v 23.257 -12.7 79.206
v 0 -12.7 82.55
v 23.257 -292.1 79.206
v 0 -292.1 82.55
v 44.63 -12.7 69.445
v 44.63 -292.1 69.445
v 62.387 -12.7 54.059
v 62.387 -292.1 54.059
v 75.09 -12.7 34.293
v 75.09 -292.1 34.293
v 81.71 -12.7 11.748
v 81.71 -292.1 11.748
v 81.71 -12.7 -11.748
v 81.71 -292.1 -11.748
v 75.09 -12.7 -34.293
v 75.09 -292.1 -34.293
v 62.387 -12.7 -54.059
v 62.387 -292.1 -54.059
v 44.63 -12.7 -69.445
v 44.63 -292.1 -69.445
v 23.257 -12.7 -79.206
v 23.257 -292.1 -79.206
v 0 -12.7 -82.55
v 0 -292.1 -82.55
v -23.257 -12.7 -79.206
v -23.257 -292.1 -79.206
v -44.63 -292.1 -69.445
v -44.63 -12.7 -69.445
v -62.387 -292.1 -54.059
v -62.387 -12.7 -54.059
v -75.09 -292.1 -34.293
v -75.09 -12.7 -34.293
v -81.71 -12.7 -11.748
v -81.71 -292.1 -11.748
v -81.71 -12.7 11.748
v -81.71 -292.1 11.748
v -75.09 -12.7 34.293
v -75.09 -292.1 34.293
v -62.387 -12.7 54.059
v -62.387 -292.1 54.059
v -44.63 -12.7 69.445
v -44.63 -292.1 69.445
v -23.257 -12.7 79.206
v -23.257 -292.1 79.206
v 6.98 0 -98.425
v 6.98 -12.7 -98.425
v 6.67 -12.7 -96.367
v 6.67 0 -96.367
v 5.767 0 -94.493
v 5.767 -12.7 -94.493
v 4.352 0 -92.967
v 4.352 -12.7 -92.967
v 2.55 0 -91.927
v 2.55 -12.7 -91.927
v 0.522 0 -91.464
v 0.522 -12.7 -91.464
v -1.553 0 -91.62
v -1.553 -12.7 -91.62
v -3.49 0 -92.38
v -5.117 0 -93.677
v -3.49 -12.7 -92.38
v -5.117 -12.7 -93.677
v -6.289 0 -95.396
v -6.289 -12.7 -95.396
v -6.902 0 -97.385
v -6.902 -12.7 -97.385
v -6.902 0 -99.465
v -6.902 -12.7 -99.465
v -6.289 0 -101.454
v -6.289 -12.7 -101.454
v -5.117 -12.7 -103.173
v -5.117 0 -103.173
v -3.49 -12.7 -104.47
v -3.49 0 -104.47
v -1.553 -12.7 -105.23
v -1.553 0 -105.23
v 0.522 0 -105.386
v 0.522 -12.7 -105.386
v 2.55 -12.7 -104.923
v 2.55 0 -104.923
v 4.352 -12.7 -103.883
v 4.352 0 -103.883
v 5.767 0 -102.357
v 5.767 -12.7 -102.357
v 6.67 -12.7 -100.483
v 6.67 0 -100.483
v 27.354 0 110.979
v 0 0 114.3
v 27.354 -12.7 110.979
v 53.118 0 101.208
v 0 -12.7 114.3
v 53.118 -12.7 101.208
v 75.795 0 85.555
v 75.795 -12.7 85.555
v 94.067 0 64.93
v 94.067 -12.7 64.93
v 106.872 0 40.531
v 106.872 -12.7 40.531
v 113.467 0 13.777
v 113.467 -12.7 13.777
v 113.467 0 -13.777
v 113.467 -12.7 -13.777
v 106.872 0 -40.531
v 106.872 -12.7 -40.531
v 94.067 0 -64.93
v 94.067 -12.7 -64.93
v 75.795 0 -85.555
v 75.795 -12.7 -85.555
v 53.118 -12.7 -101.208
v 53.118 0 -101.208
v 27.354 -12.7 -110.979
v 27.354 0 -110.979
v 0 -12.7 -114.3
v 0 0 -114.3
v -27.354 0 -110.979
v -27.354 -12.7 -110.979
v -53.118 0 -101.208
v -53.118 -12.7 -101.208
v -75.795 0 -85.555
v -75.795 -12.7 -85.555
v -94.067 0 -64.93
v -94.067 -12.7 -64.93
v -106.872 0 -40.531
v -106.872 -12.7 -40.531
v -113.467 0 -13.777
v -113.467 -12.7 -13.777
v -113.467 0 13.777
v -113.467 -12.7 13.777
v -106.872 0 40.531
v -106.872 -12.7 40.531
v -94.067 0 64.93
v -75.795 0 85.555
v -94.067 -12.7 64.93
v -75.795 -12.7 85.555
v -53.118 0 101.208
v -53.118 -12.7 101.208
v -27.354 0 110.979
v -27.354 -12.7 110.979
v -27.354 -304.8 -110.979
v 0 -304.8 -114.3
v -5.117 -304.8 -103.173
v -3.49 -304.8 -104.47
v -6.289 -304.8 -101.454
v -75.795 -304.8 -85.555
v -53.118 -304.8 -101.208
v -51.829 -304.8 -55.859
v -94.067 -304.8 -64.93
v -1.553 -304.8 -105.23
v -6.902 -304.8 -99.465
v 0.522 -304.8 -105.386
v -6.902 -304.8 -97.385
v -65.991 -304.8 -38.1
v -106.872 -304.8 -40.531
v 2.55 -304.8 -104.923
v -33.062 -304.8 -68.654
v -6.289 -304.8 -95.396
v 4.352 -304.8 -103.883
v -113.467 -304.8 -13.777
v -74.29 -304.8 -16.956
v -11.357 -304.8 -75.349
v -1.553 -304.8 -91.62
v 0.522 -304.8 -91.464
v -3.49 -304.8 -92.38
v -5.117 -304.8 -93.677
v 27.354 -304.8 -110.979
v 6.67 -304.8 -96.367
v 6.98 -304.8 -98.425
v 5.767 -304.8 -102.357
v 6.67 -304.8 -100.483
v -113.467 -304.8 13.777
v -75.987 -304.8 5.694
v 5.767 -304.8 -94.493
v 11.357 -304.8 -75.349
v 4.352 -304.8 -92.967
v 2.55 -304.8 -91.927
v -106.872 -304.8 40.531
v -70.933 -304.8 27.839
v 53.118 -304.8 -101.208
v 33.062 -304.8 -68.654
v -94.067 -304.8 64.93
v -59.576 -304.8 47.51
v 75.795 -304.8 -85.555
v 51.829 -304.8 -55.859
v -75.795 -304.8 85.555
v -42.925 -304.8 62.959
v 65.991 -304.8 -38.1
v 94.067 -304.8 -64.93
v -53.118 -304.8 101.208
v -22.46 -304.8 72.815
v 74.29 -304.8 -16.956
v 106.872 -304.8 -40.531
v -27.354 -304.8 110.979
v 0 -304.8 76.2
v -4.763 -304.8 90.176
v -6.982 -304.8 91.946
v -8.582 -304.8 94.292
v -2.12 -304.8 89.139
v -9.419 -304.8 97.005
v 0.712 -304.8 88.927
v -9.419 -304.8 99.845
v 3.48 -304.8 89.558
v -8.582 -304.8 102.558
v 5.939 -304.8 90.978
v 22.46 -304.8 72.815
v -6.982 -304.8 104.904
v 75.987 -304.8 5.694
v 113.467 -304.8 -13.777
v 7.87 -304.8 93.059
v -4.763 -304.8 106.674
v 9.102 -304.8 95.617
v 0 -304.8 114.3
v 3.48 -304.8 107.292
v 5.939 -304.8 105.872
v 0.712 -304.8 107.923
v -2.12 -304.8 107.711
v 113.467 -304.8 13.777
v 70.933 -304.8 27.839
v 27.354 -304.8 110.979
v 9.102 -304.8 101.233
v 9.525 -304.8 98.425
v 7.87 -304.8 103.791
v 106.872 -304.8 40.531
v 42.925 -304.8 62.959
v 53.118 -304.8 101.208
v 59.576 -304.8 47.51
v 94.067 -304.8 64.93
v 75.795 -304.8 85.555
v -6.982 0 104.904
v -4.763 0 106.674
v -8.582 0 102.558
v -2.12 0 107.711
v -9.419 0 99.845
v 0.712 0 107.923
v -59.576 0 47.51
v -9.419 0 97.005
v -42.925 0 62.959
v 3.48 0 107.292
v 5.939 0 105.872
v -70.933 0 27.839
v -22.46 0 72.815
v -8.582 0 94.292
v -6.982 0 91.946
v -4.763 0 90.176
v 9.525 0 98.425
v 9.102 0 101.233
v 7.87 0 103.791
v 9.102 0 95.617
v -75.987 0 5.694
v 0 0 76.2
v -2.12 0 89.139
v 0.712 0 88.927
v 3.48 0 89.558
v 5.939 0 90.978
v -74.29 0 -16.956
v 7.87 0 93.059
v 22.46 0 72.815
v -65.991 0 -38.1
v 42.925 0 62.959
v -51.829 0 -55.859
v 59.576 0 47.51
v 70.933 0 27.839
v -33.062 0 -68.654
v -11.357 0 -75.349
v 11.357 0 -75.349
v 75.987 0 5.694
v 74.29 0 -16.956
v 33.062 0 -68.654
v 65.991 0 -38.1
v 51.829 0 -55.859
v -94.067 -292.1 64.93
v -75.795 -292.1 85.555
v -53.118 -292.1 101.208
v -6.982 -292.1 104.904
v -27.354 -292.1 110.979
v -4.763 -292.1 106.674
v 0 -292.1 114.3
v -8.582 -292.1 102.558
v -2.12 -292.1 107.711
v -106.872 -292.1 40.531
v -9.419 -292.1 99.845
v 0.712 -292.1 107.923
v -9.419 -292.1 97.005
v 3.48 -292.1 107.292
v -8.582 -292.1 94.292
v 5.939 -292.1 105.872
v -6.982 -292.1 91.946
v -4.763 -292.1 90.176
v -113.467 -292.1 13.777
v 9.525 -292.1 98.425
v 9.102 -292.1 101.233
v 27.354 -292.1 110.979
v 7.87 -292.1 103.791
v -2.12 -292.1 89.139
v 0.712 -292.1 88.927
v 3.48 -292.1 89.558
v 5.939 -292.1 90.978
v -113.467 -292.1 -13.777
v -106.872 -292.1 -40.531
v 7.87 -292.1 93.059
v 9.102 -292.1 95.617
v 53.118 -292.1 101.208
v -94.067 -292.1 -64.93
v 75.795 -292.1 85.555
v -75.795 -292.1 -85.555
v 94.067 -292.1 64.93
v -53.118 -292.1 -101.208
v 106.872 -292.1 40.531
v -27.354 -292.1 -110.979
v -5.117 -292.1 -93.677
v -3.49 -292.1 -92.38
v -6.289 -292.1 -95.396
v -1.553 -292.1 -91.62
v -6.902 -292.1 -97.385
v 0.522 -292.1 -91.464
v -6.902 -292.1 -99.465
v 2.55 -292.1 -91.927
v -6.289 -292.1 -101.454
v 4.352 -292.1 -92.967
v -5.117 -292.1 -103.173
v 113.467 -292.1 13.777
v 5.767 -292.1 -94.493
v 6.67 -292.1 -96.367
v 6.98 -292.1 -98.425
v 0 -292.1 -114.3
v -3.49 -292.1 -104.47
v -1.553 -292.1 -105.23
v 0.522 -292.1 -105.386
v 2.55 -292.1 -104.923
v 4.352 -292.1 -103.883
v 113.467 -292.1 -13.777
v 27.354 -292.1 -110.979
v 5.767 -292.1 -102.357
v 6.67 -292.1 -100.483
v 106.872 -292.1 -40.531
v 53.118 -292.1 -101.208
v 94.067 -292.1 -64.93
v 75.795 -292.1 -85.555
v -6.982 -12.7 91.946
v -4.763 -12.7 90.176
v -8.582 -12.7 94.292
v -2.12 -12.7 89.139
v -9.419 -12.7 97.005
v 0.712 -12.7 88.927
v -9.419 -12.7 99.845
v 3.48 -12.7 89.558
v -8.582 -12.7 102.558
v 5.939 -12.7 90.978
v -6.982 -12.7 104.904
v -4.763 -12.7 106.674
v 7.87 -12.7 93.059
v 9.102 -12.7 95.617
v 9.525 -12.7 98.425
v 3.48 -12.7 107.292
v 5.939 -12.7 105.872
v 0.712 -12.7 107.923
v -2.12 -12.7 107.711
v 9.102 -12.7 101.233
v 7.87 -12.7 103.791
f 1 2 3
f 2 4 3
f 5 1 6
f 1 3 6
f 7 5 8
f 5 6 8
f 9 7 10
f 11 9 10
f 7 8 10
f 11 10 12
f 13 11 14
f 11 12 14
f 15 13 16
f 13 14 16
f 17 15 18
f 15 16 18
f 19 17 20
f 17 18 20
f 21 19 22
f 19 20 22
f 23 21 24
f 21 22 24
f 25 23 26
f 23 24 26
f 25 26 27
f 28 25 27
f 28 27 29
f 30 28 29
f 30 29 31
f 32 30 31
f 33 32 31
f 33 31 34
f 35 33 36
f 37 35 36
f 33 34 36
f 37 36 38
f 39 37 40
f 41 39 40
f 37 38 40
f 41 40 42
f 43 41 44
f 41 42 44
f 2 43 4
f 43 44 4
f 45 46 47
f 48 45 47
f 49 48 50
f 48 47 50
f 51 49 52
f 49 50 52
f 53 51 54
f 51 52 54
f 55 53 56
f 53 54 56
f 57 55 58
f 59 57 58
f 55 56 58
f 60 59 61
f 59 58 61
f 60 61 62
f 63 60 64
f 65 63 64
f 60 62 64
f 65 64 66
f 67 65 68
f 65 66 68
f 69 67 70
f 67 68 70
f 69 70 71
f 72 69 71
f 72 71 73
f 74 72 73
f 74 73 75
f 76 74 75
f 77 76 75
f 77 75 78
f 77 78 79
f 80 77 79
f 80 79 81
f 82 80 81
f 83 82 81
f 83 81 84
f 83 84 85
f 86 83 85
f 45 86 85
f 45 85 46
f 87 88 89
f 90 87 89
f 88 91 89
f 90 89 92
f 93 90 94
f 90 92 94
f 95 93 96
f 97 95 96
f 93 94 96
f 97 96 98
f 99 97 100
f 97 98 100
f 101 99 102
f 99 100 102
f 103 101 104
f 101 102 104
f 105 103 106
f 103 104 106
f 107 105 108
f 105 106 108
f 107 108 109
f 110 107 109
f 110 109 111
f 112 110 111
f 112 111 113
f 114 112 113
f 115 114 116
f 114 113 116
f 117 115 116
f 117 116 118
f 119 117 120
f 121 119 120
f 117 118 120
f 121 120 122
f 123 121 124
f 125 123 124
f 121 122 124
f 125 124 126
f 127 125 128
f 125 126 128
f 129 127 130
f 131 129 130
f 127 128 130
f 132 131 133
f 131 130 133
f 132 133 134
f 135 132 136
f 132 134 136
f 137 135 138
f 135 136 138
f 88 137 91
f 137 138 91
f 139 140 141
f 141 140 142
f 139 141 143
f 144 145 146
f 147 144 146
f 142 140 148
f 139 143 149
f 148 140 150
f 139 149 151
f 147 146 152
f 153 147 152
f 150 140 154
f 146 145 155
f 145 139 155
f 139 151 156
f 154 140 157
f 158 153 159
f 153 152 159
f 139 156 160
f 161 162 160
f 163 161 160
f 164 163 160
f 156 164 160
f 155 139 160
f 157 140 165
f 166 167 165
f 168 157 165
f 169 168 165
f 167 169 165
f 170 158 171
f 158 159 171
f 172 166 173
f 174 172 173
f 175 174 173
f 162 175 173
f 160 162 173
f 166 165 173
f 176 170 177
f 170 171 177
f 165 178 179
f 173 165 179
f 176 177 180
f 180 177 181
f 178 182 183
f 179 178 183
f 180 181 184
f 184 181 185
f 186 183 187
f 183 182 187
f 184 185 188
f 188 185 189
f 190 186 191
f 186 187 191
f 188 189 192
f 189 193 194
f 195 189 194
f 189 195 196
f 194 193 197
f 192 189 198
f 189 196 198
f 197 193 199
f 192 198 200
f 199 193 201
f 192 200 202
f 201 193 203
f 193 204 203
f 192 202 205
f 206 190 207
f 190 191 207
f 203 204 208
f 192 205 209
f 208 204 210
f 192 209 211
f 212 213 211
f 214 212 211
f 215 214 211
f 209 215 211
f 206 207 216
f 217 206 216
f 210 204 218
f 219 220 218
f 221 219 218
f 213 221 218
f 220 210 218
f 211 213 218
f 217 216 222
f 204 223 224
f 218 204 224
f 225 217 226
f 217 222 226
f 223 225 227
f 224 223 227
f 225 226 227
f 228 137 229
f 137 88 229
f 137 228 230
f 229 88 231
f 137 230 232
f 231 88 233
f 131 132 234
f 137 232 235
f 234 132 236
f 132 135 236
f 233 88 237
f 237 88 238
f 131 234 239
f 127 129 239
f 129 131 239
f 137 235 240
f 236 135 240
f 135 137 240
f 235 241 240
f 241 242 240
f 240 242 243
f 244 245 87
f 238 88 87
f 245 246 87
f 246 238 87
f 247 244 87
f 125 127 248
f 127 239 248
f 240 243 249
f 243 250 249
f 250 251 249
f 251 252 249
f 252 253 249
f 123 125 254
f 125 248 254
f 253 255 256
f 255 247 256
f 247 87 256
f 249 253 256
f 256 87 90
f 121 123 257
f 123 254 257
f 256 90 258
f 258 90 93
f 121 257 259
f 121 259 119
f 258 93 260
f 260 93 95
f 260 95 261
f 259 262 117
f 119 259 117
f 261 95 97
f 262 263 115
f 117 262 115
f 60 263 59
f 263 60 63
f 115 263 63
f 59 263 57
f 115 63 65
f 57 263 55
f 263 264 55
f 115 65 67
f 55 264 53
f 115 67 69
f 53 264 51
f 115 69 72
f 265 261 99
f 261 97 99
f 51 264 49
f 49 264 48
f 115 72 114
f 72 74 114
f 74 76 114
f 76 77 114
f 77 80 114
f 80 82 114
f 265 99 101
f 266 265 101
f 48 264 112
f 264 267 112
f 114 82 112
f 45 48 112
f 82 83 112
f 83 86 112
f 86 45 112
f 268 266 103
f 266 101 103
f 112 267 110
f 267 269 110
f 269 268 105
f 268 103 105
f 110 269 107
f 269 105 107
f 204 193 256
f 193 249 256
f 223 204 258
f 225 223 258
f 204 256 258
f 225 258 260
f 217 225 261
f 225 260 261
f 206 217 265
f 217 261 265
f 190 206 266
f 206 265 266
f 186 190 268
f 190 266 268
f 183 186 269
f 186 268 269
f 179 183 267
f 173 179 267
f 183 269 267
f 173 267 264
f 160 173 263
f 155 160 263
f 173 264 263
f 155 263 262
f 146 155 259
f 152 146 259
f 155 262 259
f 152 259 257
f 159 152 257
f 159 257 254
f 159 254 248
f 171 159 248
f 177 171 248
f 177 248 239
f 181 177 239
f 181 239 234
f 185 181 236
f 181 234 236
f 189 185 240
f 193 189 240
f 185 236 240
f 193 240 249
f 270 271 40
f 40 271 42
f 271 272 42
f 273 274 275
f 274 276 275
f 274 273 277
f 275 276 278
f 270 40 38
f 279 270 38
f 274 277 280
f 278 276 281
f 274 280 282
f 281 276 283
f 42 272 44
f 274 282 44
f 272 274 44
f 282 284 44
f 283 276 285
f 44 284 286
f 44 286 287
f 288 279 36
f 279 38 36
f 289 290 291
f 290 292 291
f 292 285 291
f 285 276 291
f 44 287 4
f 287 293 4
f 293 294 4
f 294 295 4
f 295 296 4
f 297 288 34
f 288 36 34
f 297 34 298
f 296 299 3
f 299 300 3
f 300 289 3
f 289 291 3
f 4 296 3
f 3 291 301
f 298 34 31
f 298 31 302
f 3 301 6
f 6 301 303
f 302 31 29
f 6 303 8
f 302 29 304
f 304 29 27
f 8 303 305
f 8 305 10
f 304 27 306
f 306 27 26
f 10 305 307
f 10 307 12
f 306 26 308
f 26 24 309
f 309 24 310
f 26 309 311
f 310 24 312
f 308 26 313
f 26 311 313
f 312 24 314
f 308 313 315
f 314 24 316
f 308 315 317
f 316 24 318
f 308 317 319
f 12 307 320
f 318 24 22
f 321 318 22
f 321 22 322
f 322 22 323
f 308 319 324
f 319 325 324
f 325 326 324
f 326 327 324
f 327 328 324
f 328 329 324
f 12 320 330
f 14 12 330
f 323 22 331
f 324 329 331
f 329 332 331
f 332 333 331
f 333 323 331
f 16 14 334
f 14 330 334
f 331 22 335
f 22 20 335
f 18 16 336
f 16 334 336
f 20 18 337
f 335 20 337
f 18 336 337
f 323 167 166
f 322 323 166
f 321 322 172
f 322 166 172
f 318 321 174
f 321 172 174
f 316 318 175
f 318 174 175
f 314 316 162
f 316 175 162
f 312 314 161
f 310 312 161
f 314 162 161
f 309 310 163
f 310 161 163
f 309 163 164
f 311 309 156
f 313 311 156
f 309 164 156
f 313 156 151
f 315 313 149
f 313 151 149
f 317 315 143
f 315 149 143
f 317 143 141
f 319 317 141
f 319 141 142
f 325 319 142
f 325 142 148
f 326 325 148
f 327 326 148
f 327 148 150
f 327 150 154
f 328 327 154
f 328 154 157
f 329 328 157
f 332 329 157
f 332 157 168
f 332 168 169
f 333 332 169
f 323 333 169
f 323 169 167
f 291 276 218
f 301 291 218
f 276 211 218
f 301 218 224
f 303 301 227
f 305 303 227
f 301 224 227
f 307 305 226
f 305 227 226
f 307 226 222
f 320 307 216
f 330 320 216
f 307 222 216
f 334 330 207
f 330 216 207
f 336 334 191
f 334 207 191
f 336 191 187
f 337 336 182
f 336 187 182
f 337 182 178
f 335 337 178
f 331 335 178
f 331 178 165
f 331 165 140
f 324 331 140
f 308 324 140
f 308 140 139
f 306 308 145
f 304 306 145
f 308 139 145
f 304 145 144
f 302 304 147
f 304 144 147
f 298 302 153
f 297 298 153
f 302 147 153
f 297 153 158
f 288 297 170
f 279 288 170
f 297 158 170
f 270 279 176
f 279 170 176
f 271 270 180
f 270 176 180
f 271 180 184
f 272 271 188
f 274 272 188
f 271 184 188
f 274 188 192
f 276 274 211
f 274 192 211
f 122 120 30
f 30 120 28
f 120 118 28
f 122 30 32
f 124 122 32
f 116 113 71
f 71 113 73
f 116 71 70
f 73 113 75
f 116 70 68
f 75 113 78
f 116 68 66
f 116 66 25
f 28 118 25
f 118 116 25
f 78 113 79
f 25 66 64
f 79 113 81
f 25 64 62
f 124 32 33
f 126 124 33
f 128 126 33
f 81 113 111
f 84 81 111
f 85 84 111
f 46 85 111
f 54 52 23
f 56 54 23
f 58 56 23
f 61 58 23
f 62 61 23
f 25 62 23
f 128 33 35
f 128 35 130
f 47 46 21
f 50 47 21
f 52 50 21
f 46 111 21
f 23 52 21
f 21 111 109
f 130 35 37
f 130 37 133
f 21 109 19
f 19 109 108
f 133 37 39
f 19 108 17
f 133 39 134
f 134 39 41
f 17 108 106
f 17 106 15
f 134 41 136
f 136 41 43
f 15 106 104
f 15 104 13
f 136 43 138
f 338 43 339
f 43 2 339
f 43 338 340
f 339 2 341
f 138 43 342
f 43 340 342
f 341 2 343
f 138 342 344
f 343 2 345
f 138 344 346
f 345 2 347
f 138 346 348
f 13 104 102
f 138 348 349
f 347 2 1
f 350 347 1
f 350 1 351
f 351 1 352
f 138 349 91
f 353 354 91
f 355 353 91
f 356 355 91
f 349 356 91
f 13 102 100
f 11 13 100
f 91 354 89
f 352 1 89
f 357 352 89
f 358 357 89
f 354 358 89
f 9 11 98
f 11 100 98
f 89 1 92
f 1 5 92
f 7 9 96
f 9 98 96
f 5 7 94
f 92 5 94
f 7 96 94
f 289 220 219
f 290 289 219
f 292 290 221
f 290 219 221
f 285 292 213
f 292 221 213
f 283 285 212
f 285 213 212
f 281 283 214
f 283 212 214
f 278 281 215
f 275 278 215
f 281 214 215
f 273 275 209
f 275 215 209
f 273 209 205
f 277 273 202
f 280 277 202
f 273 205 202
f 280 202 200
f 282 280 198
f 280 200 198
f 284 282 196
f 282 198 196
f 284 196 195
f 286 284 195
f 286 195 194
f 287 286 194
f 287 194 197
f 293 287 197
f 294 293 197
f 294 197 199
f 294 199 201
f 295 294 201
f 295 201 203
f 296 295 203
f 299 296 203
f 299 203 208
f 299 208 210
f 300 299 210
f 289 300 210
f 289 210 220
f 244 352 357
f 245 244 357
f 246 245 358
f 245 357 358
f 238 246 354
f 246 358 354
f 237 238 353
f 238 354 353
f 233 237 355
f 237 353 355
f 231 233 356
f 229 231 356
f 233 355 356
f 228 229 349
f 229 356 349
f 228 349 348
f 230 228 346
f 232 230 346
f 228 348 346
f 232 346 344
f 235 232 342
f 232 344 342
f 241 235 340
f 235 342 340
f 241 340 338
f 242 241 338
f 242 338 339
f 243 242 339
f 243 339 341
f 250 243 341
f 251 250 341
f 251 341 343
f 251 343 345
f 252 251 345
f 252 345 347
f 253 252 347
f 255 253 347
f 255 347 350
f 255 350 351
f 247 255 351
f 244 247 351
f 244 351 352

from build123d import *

# Parameters (mm, degrees)
F3_R     = 9.525
F3_R_2   = 6.980415
F4_DEPTH = 304.801


with BuildPart() as f1:
    # F0 (on Right) → F1 (revolve)
    with BuildSketch(Plane.YZ):
        Polygon((0, 76.2), (0, 114.3), (-12.7, 114.3), (-12.7, 82.55), (-292.1, 82.55), (-292.1, 114.3), (-304.8, 114.3), (-304.8, 76.2), align=None)
    revolve(axis=Axis((0, 69.986956, 0), (0, 1, 0)))

    # F3 (on offset) → F4 (cut, through all)
    with BuildSketch(Plane.XZ.offset(304.8)):
        with Locations((0, 98.425)):
            Circle(F3_R)
        with Locations((0, -98.425)):
            Circle(F3_R_2)
    extrude(amount=-F4_DEPTH, mode=Mode.SUBTRACT)


solid = f1.part
